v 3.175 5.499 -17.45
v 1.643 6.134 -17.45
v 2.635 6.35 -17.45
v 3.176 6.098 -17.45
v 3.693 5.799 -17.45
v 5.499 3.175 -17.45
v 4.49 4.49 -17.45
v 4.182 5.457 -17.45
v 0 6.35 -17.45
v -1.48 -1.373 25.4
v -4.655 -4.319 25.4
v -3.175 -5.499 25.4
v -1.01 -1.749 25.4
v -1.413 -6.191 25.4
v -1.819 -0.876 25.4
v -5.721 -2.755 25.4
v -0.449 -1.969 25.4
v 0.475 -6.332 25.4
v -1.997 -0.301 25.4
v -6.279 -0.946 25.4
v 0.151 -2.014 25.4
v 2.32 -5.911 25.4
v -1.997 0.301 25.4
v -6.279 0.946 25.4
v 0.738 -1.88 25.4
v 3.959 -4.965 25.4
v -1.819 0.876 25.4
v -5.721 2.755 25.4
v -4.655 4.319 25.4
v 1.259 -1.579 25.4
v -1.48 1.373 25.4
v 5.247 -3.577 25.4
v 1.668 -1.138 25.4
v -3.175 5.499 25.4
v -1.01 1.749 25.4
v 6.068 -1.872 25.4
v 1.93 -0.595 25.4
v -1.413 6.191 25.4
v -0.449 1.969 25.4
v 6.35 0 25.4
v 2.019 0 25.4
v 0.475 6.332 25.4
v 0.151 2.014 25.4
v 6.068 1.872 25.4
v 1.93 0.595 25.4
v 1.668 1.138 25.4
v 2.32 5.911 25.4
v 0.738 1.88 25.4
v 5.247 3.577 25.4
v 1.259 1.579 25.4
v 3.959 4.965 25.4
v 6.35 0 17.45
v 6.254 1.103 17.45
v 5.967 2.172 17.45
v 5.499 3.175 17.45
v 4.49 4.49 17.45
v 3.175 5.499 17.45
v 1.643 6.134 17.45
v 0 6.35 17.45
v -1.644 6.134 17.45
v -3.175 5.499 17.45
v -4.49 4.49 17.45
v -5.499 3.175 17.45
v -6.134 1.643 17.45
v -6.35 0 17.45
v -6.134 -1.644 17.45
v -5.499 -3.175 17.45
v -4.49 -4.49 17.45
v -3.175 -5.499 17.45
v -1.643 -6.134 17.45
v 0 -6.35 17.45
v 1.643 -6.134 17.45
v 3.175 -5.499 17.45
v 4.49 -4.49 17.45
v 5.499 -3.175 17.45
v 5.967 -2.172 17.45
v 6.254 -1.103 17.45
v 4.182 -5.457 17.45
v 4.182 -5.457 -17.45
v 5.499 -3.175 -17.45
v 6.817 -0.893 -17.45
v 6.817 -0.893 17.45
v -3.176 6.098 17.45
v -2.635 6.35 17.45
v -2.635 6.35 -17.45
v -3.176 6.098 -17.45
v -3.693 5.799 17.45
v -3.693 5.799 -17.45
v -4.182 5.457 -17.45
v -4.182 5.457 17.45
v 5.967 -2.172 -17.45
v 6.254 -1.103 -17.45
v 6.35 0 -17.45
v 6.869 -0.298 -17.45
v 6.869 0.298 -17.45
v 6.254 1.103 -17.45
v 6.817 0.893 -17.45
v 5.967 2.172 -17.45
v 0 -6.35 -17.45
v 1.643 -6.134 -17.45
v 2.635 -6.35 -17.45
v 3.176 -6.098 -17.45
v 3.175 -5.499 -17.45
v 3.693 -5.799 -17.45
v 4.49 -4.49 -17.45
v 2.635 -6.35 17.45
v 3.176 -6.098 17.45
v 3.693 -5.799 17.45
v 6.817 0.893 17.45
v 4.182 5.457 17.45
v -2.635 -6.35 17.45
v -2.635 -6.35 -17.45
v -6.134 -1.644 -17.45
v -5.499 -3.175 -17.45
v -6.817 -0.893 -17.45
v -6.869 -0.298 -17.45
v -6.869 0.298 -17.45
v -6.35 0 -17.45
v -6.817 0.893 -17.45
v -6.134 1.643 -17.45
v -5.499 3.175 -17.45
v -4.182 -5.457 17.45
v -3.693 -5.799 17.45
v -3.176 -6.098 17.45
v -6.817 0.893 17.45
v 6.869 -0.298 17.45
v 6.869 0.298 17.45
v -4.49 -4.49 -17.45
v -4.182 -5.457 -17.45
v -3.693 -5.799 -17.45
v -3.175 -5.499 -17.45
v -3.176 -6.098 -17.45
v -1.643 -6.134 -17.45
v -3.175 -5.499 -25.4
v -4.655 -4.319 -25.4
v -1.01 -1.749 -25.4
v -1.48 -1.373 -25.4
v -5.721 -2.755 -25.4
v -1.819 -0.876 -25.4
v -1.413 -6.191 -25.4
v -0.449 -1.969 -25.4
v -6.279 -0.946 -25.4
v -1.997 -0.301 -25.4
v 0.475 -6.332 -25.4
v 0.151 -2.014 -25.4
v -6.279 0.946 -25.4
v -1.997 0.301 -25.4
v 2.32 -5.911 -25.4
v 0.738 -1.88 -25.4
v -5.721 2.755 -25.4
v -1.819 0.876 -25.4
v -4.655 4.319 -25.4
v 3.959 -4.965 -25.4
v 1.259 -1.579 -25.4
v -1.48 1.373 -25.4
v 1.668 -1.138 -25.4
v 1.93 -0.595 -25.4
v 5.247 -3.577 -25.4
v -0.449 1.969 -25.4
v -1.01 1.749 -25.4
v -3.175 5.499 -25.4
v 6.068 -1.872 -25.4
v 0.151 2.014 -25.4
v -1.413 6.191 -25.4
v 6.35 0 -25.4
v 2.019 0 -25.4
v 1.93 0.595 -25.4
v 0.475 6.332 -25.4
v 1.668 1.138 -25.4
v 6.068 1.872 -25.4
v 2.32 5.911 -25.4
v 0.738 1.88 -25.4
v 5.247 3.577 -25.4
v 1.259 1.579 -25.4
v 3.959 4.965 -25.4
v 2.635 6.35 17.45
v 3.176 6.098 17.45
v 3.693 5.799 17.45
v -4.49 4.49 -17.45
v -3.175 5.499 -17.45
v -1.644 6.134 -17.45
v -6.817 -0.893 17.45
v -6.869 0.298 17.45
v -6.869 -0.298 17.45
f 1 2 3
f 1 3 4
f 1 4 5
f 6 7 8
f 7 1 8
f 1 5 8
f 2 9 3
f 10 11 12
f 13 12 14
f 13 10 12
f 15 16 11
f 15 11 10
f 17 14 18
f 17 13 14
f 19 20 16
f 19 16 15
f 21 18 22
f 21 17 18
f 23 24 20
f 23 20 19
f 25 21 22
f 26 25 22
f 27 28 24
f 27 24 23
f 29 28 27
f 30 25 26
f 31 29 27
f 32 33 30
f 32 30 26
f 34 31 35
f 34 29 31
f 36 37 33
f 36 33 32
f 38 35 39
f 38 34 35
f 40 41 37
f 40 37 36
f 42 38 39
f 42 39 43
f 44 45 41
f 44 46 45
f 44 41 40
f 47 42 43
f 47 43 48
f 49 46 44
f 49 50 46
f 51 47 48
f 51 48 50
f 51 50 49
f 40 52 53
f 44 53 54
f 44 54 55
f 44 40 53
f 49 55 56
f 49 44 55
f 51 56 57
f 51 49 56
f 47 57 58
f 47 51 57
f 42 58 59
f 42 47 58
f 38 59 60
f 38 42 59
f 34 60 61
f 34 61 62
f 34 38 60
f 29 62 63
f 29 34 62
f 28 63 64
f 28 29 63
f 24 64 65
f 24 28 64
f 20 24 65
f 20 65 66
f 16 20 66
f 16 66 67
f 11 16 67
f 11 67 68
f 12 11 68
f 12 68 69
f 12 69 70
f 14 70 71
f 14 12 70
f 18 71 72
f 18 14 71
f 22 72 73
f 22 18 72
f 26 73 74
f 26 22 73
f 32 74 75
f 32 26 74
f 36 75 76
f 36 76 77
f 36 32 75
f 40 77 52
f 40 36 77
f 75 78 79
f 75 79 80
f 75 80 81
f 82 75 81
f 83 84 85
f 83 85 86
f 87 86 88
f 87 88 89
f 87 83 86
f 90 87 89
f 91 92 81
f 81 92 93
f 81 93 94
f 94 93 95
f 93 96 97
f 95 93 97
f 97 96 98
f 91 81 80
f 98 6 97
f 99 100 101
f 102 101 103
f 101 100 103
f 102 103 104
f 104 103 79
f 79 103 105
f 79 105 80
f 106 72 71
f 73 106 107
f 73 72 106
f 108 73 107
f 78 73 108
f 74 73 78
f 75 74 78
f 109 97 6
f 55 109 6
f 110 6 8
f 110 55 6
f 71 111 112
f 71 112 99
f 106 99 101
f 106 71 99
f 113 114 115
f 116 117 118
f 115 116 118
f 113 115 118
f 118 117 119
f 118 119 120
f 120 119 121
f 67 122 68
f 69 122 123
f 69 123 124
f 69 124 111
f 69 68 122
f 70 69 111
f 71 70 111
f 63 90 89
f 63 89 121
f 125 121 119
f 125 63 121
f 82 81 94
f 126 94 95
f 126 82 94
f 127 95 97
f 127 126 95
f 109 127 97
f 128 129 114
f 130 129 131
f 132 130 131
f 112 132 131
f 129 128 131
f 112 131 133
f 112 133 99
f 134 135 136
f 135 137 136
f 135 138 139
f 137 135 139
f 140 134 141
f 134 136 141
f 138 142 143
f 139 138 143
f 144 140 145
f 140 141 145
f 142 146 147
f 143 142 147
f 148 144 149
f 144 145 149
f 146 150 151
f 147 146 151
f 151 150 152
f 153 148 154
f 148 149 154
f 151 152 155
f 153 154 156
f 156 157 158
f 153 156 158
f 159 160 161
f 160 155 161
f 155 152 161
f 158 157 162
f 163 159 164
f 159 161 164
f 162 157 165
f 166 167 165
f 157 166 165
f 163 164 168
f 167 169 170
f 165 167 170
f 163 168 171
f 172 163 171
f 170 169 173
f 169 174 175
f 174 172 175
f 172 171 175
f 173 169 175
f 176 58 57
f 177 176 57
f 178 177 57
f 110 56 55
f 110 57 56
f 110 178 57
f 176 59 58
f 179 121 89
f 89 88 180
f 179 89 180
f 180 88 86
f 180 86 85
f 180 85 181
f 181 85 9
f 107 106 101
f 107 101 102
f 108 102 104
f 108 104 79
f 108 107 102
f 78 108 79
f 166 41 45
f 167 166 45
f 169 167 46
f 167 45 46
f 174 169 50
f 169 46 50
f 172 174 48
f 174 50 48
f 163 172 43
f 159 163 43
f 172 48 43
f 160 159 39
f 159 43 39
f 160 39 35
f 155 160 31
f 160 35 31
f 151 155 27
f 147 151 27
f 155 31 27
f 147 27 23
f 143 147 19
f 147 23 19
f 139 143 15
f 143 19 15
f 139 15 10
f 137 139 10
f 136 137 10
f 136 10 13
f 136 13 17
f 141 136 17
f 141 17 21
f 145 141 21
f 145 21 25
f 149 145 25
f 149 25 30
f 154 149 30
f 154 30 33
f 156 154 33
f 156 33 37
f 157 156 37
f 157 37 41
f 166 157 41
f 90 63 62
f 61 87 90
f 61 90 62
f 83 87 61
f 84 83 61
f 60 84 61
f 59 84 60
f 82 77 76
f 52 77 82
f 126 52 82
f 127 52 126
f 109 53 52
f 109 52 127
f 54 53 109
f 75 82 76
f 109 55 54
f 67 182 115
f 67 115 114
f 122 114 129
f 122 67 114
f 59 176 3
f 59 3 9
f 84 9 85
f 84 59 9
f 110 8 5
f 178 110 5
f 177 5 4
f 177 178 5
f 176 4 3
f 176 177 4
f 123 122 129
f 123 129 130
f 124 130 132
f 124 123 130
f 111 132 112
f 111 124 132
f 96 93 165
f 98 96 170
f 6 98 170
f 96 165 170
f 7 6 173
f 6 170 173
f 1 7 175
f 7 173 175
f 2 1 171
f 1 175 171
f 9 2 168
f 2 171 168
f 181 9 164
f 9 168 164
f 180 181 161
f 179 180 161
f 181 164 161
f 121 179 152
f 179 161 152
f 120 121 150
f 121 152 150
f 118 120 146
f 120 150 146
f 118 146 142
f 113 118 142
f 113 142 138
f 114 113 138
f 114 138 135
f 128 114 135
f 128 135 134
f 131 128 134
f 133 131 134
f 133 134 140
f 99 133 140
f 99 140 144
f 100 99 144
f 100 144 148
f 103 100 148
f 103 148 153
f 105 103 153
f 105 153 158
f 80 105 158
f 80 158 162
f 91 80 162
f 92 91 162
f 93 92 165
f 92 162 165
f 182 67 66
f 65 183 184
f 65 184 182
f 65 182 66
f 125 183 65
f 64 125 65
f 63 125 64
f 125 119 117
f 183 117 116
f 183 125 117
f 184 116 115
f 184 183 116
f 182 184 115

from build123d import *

# Parameters (mm, degrees)
BOSS_EXTRUDE1_DEPTH = 25.4
SKETCH2_OUTSIDE_W   = 27.54
SKETCH2_OUTSIDE_H   = 25.576
SKETCH2_OUTSIDE_R   = 6.35
CUT_EXTRUDE2_DEPTH  = 7.9502
SKETCH3_OUTSIDE_W   = 27.54
SKETCH3_OUTSIDE_H   = 25.576
SKETCH3_OUTSIDE_R   = 6.875
CUT_EXTRUDE4_DEPTH  = 52.717751627
SKETCH4_R           = 2.0193
CUT_EXTRUDE5_DEPTH  = 52.654894492


with BuildPart() as part:
    # Sketch1 → Boss-Extrude1 (new, symmetric)
    with BuildSketch(Plane.XY):
        Polygon((7.332348419, 0), (3.666174209, 6.35), (-3.666174209, 6.35), (-7.332348419, 0), (-3.666174209, -6.35), (3.666174209, -6.35), align=None)
    extrude(amount=BOSS_EXTRUDE1_DEPTH, both=True)

    # Sketch2 outside → Cut-Extrude2 (cut)
    with BuildSketch(Plane.XY.offset(25.4)):
        Rectangle(SKETCH2_OUTSIDE_W, SKETCH2_OUTSIDE_H)
        Circle(SKETCH2_OUTSIDE_R, mode=Mode.SUBTRACT)
    cut_extrude2 = extrude(amount=-CUT_EXTRUDE2_DEPTH, mode=Mode.SUBTRACT)

    # Sketch3 outside → Cut-Extrude4 (cut, through all)
    with BuildSketch(Plane.XY.offset(25.4)):
        Rectangle(SKETCH3_OUTSIDE_W, SKETCH3_OUTSIDE_H)
        Circle(SKETCH3_OUTSIDE_R, mode=Mode.SUBTRACT)
    extrude(amount=-CUT_EXTRUDE4_DEPTH, mode=Mode.SUBTRACT)

    # Mirror1: Cut-Extrude2 across plane
    add(cut_extrude2.mirror(Plane.XY), mode=Mode.SUBTRACT)

    # Sketch4 → Cut-Extrude5 (cut, through all)
    with BuildSketch(Plane.XY.offset(25.4)):
        Circle(SKETCH4_R)
    extrude(amount=-CUT_EXTRUDE5_DEPTH, mode=Mode.SUBTRACT)


solid = part.part
